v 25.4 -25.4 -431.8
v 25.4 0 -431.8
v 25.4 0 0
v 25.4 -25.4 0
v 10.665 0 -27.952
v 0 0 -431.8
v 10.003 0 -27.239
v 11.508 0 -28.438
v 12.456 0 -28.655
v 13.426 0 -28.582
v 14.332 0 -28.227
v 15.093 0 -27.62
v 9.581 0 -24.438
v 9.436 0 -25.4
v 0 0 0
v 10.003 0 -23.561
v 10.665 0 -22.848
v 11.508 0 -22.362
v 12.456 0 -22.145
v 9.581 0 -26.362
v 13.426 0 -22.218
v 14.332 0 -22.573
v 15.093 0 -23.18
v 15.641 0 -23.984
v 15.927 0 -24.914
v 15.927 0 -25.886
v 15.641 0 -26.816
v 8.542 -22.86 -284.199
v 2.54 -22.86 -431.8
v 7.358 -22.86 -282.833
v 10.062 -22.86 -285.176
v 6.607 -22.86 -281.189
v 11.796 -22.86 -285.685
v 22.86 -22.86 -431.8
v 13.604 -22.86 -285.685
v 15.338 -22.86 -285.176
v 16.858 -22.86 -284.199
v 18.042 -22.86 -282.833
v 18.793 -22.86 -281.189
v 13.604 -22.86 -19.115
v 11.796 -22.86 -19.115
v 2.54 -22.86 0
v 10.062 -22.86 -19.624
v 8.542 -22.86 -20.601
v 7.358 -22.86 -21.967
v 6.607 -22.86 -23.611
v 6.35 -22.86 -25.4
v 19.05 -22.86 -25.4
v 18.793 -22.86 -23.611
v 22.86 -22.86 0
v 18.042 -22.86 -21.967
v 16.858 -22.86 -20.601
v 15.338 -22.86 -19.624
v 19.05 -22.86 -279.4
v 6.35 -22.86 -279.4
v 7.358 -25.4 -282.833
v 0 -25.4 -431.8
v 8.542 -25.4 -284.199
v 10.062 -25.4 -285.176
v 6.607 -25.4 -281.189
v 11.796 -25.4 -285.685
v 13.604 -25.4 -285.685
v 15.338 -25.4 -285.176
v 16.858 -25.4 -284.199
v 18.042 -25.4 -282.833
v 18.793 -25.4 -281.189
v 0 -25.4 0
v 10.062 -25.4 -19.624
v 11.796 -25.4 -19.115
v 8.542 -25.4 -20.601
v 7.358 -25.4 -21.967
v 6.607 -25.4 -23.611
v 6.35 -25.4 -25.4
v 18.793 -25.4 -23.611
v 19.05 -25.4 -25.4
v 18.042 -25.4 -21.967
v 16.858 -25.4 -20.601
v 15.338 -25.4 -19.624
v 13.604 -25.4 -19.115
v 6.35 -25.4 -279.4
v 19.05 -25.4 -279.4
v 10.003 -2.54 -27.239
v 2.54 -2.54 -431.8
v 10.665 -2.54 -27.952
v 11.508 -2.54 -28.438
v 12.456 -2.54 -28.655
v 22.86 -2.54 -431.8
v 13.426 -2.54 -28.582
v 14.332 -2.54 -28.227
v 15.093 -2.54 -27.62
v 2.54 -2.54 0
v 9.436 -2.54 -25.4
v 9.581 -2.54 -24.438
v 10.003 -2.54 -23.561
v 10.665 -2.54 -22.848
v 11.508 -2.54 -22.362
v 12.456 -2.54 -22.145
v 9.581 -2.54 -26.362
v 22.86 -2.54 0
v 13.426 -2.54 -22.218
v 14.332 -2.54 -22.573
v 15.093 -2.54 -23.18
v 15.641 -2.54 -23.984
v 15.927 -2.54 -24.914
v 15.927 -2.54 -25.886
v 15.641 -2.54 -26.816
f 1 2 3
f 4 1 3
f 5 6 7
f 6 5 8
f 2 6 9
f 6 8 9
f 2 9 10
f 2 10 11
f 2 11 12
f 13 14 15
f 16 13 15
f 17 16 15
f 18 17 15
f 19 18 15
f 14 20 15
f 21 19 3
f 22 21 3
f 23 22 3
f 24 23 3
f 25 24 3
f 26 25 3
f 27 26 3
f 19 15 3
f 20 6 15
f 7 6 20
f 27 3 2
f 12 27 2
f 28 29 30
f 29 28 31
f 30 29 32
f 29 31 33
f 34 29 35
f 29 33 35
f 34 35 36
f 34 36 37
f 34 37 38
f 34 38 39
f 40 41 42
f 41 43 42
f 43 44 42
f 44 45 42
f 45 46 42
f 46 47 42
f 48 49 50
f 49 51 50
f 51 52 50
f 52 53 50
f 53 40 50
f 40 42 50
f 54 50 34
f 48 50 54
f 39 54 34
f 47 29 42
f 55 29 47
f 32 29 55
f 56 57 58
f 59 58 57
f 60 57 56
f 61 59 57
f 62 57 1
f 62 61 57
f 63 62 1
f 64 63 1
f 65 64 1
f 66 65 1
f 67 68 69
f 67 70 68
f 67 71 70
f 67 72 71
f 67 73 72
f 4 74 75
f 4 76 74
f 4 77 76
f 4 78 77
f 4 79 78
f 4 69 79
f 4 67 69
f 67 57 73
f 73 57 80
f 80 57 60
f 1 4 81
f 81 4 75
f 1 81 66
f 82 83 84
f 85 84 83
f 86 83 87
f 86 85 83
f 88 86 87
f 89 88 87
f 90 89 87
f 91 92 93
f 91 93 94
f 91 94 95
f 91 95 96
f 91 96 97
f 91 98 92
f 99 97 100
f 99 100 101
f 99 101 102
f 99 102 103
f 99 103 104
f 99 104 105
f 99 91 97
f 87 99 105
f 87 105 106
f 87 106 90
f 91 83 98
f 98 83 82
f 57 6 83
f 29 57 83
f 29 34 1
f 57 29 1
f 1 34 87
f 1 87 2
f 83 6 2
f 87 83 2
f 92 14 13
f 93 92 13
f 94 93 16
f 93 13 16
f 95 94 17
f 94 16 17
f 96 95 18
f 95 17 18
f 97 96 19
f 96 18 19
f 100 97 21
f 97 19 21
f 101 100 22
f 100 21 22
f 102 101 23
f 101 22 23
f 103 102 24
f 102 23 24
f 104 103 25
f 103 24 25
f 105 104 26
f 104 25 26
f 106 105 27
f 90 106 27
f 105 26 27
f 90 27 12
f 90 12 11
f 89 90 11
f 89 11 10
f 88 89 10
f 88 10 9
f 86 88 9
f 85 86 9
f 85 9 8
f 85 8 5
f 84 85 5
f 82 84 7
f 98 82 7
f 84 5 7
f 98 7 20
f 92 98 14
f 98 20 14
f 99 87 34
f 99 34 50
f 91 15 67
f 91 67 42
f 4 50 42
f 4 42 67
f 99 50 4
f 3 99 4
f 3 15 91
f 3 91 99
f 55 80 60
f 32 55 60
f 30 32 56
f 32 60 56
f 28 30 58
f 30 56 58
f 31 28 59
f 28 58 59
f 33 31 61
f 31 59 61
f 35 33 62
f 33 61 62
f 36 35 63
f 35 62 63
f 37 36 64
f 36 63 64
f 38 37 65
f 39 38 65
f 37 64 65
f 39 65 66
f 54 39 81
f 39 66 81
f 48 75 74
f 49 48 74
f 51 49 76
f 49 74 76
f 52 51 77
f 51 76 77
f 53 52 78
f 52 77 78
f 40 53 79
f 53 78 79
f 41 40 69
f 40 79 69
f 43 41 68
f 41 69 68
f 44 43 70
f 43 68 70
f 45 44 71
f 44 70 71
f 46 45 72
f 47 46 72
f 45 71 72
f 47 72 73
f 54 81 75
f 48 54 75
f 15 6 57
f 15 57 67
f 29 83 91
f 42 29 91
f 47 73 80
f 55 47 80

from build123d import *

# Parameters (mm, degrees)
F0_W     = 25.4
F0_H     = 431.8
F1_DEPTH = 25.4
F2_T     = -2.54
F4_DEPTH = 6.35
F5_R     = 3.2639
F6_DEPTH = 2.54


with BuildPart() as f1:
    # F0 (on Front) → F1 (new body)
    with BuildSketch(Plane.XZ):
        with Locations((12.7, -215.9)):
            Rectangle(F0_W, F0_H)
    extrude(amount=F1_DEPTH)

    # F2
    f2_openings = [f1.faces().sort_by_distance(p)[0] for p in [
        (12.7, -12.7, 0),
        (12.7, -12.7, -431.8),
    ]]
    offset(amount=F2_T, openings=f2_openings)

    # F3 (on face) → F4 (cut)
    with BuildSketch(Plane.XZ.offset(25.4)):
        with BuildLine():
            Line((19.05, -279.4), (19.05, -25.4))
            ThreePointArc((19.05, -25.4), (12.7, -19.05), (6.35, -25.4))
            Line((6.35, -25.4), (6.35, -279.4))
            ThreePointArc((6.35, -279.4), (12.7, -285.75), (19.05, -279.4))
        make_face()
    extrude(amount=-F4_DEPTH, mode=Mode.SUBTRACT)

    # F5 (on face) → F6 (cut)
    with BuildSketch(Plane(origin=(0, 0, 0), x_dir=(-1, 0, 0), z_dir=(0, 1, 0))):
        with Locations((-12.7, -25.4)):
            Circle(F5_R)
    extrude(amount=-F6_DEPTH, mode=Mode.SUBTRACT)


solid = f1.part
